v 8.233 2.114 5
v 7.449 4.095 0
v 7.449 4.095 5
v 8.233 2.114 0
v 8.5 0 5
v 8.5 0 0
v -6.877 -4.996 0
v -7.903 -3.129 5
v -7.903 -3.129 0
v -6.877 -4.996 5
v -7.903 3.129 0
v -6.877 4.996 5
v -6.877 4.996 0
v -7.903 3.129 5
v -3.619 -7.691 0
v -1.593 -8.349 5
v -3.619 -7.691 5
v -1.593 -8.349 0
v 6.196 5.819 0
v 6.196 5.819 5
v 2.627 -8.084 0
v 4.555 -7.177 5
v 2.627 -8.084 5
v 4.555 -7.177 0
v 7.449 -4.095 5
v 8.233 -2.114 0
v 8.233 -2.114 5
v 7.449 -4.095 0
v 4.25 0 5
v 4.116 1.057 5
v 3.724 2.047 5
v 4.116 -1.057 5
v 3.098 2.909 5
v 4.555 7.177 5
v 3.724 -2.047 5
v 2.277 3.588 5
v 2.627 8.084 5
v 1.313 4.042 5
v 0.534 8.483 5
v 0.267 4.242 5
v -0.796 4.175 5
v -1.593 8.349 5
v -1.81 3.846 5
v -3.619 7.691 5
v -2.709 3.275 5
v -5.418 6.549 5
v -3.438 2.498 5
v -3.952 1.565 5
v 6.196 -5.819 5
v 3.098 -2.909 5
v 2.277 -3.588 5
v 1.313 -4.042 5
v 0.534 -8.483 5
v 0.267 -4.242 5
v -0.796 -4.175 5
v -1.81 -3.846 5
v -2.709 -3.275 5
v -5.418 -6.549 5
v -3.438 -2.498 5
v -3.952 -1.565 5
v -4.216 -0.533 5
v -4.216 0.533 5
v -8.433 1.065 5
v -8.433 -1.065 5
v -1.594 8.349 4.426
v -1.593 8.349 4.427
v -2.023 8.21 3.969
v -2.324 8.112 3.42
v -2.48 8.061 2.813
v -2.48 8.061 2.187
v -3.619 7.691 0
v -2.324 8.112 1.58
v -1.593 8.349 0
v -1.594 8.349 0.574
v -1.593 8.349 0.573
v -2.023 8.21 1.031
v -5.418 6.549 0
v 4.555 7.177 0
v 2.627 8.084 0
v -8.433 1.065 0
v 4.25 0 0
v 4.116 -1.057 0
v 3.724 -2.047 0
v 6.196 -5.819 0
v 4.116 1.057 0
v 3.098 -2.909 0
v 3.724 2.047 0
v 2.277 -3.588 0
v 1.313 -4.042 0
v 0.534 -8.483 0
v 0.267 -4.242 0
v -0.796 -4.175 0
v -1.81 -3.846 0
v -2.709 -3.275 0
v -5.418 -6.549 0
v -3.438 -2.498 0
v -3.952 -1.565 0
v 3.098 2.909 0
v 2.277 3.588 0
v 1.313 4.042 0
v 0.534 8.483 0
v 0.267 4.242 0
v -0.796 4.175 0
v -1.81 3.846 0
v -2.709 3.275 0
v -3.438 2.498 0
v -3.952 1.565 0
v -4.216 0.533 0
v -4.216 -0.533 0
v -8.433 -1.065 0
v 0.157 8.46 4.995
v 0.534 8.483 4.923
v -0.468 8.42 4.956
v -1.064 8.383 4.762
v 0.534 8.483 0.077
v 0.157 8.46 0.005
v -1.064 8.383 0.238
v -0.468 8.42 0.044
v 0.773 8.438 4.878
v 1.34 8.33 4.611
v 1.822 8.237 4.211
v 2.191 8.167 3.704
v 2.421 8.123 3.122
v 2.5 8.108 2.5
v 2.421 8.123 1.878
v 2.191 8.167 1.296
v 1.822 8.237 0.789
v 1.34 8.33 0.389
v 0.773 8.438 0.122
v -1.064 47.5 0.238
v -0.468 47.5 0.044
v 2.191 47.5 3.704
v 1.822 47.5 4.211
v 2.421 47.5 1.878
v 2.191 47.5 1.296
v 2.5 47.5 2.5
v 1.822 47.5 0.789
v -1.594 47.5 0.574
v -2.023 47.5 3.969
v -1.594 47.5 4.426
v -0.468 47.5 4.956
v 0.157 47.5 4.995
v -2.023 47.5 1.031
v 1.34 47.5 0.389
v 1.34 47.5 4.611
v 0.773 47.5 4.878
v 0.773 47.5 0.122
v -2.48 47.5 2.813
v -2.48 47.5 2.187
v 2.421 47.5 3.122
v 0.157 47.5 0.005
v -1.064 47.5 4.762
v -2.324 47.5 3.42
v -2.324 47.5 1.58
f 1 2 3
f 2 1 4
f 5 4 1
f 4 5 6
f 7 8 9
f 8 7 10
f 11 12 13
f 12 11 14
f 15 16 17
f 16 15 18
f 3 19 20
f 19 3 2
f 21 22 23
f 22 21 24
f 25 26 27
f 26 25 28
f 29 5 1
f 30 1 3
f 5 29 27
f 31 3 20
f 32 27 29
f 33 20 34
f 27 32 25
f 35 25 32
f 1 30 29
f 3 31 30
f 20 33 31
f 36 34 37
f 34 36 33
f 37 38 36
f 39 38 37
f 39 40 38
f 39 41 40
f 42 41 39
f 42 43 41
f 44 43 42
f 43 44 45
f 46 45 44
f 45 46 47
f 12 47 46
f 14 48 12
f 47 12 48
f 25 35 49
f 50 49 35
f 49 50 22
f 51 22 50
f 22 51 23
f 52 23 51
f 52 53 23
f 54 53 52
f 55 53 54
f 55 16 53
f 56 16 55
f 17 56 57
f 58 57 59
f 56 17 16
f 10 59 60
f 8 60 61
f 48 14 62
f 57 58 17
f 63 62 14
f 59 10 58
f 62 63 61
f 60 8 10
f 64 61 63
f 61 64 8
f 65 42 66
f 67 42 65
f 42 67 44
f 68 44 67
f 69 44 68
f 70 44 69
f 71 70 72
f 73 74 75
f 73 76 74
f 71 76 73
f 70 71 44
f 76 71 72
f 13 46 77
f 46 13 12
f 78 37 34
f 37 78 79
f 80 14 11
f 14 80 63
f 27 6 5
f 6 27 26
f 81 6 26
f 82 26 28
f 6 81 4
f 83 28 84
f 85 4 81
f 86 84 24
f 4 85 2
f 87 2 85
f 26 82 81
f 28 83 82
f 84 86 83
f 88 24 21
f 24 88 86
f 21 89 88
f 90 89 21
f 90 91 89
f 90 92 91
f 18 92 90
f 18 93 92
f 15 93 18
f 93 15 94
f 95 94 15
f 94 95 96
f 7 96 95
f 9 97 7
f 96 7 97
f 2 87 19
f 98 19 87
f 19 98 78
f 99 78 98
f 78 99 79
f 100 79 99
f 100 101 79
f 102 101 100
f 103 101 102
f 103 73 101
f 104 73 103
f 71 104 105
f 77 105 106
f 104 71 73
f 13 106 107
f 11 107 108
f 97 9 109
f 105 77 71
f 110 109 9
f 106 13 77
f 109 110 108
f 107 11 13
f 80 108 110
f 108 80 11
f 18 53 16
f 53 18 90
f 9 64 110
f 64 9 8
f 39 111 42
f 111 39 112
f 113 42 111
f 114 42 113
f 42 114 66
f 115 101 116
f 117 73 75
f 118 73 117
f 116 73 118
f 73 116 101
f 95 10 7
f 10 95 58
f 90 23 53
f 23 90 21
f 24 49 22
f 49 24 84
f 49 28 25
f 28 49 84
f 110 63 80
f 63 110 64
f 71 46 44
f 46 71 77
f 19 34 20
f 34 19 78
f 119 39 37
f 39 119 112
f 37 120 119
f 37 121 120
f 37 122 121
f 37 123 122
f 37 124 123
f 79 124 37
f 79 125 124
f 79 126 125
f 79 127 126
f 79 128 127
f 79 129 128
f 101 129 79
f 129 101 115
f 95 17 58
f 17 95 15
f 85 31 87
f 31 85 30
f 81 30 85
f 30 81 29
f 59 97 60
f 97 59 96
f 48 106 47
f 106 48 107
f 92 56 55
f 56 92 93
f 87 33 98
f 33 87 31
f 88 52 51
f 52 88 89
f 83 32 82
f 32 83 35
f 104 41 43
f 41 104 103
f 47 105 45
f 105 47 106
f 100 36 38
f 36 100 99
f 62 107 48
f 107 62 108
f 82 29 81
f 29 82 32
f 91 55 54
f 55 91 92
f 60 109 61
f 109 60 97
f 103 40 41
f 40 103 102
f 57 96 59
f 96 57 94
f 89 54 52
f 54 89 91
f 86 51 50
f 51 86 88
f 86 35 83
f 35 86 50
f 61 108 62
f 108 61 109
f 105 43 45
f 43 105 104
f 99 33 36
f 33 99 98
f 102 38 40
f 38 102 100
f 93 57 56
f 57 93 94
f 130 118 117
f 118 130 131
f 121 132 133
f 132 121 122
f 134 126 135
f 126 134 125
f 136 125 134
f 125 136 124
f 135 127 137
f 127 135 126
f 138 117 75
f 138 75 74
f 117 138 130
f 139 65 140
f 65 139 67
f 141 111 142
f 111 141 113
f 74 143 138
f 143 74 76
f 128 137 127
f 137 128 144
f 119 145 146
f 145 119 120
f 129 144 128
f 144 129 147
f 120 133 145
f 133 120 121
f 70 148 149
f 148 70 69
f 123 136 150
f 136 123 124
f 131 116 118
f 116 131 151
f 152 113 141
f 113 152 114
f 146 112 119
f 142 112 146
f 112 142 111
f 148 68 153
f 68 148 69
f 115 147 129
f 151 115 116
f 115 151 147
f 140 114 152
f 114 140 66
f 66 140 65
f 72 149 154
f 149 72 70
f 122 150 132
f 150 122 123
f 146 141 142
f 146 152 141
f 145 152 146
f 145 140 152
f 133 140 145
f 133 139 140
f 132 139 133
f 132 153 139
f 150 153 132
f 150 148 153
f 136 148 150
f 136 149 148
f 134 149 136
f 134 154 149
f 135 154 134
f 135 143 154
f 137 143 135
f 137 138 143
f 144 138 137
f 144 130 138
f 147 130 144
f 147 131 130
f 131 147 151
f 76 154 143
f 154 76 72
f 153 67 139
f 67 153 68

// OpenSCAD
$fn = 25; //boots

l_finger = 40;
dia_finger = 5;

stud_clear_dia = 8.5;
washer_dia = 17;
thk = dia_finger;

module hollow_cylinder(id,od,height)
{
    difference()
    {
        cylinder(d=od,h=height);
        cylinder(d=id,h=height);
    }
    
}

union()
{
//ring
hollow_cylinder(id=stud_clear_dia, od=washer_dia, height=thk);

//finger
translate([0,washer_dia/2-1,dia_finger/2])
rotate([270,0,0])
cylinder(d=dia_finger,h=l_finger);
}
    
